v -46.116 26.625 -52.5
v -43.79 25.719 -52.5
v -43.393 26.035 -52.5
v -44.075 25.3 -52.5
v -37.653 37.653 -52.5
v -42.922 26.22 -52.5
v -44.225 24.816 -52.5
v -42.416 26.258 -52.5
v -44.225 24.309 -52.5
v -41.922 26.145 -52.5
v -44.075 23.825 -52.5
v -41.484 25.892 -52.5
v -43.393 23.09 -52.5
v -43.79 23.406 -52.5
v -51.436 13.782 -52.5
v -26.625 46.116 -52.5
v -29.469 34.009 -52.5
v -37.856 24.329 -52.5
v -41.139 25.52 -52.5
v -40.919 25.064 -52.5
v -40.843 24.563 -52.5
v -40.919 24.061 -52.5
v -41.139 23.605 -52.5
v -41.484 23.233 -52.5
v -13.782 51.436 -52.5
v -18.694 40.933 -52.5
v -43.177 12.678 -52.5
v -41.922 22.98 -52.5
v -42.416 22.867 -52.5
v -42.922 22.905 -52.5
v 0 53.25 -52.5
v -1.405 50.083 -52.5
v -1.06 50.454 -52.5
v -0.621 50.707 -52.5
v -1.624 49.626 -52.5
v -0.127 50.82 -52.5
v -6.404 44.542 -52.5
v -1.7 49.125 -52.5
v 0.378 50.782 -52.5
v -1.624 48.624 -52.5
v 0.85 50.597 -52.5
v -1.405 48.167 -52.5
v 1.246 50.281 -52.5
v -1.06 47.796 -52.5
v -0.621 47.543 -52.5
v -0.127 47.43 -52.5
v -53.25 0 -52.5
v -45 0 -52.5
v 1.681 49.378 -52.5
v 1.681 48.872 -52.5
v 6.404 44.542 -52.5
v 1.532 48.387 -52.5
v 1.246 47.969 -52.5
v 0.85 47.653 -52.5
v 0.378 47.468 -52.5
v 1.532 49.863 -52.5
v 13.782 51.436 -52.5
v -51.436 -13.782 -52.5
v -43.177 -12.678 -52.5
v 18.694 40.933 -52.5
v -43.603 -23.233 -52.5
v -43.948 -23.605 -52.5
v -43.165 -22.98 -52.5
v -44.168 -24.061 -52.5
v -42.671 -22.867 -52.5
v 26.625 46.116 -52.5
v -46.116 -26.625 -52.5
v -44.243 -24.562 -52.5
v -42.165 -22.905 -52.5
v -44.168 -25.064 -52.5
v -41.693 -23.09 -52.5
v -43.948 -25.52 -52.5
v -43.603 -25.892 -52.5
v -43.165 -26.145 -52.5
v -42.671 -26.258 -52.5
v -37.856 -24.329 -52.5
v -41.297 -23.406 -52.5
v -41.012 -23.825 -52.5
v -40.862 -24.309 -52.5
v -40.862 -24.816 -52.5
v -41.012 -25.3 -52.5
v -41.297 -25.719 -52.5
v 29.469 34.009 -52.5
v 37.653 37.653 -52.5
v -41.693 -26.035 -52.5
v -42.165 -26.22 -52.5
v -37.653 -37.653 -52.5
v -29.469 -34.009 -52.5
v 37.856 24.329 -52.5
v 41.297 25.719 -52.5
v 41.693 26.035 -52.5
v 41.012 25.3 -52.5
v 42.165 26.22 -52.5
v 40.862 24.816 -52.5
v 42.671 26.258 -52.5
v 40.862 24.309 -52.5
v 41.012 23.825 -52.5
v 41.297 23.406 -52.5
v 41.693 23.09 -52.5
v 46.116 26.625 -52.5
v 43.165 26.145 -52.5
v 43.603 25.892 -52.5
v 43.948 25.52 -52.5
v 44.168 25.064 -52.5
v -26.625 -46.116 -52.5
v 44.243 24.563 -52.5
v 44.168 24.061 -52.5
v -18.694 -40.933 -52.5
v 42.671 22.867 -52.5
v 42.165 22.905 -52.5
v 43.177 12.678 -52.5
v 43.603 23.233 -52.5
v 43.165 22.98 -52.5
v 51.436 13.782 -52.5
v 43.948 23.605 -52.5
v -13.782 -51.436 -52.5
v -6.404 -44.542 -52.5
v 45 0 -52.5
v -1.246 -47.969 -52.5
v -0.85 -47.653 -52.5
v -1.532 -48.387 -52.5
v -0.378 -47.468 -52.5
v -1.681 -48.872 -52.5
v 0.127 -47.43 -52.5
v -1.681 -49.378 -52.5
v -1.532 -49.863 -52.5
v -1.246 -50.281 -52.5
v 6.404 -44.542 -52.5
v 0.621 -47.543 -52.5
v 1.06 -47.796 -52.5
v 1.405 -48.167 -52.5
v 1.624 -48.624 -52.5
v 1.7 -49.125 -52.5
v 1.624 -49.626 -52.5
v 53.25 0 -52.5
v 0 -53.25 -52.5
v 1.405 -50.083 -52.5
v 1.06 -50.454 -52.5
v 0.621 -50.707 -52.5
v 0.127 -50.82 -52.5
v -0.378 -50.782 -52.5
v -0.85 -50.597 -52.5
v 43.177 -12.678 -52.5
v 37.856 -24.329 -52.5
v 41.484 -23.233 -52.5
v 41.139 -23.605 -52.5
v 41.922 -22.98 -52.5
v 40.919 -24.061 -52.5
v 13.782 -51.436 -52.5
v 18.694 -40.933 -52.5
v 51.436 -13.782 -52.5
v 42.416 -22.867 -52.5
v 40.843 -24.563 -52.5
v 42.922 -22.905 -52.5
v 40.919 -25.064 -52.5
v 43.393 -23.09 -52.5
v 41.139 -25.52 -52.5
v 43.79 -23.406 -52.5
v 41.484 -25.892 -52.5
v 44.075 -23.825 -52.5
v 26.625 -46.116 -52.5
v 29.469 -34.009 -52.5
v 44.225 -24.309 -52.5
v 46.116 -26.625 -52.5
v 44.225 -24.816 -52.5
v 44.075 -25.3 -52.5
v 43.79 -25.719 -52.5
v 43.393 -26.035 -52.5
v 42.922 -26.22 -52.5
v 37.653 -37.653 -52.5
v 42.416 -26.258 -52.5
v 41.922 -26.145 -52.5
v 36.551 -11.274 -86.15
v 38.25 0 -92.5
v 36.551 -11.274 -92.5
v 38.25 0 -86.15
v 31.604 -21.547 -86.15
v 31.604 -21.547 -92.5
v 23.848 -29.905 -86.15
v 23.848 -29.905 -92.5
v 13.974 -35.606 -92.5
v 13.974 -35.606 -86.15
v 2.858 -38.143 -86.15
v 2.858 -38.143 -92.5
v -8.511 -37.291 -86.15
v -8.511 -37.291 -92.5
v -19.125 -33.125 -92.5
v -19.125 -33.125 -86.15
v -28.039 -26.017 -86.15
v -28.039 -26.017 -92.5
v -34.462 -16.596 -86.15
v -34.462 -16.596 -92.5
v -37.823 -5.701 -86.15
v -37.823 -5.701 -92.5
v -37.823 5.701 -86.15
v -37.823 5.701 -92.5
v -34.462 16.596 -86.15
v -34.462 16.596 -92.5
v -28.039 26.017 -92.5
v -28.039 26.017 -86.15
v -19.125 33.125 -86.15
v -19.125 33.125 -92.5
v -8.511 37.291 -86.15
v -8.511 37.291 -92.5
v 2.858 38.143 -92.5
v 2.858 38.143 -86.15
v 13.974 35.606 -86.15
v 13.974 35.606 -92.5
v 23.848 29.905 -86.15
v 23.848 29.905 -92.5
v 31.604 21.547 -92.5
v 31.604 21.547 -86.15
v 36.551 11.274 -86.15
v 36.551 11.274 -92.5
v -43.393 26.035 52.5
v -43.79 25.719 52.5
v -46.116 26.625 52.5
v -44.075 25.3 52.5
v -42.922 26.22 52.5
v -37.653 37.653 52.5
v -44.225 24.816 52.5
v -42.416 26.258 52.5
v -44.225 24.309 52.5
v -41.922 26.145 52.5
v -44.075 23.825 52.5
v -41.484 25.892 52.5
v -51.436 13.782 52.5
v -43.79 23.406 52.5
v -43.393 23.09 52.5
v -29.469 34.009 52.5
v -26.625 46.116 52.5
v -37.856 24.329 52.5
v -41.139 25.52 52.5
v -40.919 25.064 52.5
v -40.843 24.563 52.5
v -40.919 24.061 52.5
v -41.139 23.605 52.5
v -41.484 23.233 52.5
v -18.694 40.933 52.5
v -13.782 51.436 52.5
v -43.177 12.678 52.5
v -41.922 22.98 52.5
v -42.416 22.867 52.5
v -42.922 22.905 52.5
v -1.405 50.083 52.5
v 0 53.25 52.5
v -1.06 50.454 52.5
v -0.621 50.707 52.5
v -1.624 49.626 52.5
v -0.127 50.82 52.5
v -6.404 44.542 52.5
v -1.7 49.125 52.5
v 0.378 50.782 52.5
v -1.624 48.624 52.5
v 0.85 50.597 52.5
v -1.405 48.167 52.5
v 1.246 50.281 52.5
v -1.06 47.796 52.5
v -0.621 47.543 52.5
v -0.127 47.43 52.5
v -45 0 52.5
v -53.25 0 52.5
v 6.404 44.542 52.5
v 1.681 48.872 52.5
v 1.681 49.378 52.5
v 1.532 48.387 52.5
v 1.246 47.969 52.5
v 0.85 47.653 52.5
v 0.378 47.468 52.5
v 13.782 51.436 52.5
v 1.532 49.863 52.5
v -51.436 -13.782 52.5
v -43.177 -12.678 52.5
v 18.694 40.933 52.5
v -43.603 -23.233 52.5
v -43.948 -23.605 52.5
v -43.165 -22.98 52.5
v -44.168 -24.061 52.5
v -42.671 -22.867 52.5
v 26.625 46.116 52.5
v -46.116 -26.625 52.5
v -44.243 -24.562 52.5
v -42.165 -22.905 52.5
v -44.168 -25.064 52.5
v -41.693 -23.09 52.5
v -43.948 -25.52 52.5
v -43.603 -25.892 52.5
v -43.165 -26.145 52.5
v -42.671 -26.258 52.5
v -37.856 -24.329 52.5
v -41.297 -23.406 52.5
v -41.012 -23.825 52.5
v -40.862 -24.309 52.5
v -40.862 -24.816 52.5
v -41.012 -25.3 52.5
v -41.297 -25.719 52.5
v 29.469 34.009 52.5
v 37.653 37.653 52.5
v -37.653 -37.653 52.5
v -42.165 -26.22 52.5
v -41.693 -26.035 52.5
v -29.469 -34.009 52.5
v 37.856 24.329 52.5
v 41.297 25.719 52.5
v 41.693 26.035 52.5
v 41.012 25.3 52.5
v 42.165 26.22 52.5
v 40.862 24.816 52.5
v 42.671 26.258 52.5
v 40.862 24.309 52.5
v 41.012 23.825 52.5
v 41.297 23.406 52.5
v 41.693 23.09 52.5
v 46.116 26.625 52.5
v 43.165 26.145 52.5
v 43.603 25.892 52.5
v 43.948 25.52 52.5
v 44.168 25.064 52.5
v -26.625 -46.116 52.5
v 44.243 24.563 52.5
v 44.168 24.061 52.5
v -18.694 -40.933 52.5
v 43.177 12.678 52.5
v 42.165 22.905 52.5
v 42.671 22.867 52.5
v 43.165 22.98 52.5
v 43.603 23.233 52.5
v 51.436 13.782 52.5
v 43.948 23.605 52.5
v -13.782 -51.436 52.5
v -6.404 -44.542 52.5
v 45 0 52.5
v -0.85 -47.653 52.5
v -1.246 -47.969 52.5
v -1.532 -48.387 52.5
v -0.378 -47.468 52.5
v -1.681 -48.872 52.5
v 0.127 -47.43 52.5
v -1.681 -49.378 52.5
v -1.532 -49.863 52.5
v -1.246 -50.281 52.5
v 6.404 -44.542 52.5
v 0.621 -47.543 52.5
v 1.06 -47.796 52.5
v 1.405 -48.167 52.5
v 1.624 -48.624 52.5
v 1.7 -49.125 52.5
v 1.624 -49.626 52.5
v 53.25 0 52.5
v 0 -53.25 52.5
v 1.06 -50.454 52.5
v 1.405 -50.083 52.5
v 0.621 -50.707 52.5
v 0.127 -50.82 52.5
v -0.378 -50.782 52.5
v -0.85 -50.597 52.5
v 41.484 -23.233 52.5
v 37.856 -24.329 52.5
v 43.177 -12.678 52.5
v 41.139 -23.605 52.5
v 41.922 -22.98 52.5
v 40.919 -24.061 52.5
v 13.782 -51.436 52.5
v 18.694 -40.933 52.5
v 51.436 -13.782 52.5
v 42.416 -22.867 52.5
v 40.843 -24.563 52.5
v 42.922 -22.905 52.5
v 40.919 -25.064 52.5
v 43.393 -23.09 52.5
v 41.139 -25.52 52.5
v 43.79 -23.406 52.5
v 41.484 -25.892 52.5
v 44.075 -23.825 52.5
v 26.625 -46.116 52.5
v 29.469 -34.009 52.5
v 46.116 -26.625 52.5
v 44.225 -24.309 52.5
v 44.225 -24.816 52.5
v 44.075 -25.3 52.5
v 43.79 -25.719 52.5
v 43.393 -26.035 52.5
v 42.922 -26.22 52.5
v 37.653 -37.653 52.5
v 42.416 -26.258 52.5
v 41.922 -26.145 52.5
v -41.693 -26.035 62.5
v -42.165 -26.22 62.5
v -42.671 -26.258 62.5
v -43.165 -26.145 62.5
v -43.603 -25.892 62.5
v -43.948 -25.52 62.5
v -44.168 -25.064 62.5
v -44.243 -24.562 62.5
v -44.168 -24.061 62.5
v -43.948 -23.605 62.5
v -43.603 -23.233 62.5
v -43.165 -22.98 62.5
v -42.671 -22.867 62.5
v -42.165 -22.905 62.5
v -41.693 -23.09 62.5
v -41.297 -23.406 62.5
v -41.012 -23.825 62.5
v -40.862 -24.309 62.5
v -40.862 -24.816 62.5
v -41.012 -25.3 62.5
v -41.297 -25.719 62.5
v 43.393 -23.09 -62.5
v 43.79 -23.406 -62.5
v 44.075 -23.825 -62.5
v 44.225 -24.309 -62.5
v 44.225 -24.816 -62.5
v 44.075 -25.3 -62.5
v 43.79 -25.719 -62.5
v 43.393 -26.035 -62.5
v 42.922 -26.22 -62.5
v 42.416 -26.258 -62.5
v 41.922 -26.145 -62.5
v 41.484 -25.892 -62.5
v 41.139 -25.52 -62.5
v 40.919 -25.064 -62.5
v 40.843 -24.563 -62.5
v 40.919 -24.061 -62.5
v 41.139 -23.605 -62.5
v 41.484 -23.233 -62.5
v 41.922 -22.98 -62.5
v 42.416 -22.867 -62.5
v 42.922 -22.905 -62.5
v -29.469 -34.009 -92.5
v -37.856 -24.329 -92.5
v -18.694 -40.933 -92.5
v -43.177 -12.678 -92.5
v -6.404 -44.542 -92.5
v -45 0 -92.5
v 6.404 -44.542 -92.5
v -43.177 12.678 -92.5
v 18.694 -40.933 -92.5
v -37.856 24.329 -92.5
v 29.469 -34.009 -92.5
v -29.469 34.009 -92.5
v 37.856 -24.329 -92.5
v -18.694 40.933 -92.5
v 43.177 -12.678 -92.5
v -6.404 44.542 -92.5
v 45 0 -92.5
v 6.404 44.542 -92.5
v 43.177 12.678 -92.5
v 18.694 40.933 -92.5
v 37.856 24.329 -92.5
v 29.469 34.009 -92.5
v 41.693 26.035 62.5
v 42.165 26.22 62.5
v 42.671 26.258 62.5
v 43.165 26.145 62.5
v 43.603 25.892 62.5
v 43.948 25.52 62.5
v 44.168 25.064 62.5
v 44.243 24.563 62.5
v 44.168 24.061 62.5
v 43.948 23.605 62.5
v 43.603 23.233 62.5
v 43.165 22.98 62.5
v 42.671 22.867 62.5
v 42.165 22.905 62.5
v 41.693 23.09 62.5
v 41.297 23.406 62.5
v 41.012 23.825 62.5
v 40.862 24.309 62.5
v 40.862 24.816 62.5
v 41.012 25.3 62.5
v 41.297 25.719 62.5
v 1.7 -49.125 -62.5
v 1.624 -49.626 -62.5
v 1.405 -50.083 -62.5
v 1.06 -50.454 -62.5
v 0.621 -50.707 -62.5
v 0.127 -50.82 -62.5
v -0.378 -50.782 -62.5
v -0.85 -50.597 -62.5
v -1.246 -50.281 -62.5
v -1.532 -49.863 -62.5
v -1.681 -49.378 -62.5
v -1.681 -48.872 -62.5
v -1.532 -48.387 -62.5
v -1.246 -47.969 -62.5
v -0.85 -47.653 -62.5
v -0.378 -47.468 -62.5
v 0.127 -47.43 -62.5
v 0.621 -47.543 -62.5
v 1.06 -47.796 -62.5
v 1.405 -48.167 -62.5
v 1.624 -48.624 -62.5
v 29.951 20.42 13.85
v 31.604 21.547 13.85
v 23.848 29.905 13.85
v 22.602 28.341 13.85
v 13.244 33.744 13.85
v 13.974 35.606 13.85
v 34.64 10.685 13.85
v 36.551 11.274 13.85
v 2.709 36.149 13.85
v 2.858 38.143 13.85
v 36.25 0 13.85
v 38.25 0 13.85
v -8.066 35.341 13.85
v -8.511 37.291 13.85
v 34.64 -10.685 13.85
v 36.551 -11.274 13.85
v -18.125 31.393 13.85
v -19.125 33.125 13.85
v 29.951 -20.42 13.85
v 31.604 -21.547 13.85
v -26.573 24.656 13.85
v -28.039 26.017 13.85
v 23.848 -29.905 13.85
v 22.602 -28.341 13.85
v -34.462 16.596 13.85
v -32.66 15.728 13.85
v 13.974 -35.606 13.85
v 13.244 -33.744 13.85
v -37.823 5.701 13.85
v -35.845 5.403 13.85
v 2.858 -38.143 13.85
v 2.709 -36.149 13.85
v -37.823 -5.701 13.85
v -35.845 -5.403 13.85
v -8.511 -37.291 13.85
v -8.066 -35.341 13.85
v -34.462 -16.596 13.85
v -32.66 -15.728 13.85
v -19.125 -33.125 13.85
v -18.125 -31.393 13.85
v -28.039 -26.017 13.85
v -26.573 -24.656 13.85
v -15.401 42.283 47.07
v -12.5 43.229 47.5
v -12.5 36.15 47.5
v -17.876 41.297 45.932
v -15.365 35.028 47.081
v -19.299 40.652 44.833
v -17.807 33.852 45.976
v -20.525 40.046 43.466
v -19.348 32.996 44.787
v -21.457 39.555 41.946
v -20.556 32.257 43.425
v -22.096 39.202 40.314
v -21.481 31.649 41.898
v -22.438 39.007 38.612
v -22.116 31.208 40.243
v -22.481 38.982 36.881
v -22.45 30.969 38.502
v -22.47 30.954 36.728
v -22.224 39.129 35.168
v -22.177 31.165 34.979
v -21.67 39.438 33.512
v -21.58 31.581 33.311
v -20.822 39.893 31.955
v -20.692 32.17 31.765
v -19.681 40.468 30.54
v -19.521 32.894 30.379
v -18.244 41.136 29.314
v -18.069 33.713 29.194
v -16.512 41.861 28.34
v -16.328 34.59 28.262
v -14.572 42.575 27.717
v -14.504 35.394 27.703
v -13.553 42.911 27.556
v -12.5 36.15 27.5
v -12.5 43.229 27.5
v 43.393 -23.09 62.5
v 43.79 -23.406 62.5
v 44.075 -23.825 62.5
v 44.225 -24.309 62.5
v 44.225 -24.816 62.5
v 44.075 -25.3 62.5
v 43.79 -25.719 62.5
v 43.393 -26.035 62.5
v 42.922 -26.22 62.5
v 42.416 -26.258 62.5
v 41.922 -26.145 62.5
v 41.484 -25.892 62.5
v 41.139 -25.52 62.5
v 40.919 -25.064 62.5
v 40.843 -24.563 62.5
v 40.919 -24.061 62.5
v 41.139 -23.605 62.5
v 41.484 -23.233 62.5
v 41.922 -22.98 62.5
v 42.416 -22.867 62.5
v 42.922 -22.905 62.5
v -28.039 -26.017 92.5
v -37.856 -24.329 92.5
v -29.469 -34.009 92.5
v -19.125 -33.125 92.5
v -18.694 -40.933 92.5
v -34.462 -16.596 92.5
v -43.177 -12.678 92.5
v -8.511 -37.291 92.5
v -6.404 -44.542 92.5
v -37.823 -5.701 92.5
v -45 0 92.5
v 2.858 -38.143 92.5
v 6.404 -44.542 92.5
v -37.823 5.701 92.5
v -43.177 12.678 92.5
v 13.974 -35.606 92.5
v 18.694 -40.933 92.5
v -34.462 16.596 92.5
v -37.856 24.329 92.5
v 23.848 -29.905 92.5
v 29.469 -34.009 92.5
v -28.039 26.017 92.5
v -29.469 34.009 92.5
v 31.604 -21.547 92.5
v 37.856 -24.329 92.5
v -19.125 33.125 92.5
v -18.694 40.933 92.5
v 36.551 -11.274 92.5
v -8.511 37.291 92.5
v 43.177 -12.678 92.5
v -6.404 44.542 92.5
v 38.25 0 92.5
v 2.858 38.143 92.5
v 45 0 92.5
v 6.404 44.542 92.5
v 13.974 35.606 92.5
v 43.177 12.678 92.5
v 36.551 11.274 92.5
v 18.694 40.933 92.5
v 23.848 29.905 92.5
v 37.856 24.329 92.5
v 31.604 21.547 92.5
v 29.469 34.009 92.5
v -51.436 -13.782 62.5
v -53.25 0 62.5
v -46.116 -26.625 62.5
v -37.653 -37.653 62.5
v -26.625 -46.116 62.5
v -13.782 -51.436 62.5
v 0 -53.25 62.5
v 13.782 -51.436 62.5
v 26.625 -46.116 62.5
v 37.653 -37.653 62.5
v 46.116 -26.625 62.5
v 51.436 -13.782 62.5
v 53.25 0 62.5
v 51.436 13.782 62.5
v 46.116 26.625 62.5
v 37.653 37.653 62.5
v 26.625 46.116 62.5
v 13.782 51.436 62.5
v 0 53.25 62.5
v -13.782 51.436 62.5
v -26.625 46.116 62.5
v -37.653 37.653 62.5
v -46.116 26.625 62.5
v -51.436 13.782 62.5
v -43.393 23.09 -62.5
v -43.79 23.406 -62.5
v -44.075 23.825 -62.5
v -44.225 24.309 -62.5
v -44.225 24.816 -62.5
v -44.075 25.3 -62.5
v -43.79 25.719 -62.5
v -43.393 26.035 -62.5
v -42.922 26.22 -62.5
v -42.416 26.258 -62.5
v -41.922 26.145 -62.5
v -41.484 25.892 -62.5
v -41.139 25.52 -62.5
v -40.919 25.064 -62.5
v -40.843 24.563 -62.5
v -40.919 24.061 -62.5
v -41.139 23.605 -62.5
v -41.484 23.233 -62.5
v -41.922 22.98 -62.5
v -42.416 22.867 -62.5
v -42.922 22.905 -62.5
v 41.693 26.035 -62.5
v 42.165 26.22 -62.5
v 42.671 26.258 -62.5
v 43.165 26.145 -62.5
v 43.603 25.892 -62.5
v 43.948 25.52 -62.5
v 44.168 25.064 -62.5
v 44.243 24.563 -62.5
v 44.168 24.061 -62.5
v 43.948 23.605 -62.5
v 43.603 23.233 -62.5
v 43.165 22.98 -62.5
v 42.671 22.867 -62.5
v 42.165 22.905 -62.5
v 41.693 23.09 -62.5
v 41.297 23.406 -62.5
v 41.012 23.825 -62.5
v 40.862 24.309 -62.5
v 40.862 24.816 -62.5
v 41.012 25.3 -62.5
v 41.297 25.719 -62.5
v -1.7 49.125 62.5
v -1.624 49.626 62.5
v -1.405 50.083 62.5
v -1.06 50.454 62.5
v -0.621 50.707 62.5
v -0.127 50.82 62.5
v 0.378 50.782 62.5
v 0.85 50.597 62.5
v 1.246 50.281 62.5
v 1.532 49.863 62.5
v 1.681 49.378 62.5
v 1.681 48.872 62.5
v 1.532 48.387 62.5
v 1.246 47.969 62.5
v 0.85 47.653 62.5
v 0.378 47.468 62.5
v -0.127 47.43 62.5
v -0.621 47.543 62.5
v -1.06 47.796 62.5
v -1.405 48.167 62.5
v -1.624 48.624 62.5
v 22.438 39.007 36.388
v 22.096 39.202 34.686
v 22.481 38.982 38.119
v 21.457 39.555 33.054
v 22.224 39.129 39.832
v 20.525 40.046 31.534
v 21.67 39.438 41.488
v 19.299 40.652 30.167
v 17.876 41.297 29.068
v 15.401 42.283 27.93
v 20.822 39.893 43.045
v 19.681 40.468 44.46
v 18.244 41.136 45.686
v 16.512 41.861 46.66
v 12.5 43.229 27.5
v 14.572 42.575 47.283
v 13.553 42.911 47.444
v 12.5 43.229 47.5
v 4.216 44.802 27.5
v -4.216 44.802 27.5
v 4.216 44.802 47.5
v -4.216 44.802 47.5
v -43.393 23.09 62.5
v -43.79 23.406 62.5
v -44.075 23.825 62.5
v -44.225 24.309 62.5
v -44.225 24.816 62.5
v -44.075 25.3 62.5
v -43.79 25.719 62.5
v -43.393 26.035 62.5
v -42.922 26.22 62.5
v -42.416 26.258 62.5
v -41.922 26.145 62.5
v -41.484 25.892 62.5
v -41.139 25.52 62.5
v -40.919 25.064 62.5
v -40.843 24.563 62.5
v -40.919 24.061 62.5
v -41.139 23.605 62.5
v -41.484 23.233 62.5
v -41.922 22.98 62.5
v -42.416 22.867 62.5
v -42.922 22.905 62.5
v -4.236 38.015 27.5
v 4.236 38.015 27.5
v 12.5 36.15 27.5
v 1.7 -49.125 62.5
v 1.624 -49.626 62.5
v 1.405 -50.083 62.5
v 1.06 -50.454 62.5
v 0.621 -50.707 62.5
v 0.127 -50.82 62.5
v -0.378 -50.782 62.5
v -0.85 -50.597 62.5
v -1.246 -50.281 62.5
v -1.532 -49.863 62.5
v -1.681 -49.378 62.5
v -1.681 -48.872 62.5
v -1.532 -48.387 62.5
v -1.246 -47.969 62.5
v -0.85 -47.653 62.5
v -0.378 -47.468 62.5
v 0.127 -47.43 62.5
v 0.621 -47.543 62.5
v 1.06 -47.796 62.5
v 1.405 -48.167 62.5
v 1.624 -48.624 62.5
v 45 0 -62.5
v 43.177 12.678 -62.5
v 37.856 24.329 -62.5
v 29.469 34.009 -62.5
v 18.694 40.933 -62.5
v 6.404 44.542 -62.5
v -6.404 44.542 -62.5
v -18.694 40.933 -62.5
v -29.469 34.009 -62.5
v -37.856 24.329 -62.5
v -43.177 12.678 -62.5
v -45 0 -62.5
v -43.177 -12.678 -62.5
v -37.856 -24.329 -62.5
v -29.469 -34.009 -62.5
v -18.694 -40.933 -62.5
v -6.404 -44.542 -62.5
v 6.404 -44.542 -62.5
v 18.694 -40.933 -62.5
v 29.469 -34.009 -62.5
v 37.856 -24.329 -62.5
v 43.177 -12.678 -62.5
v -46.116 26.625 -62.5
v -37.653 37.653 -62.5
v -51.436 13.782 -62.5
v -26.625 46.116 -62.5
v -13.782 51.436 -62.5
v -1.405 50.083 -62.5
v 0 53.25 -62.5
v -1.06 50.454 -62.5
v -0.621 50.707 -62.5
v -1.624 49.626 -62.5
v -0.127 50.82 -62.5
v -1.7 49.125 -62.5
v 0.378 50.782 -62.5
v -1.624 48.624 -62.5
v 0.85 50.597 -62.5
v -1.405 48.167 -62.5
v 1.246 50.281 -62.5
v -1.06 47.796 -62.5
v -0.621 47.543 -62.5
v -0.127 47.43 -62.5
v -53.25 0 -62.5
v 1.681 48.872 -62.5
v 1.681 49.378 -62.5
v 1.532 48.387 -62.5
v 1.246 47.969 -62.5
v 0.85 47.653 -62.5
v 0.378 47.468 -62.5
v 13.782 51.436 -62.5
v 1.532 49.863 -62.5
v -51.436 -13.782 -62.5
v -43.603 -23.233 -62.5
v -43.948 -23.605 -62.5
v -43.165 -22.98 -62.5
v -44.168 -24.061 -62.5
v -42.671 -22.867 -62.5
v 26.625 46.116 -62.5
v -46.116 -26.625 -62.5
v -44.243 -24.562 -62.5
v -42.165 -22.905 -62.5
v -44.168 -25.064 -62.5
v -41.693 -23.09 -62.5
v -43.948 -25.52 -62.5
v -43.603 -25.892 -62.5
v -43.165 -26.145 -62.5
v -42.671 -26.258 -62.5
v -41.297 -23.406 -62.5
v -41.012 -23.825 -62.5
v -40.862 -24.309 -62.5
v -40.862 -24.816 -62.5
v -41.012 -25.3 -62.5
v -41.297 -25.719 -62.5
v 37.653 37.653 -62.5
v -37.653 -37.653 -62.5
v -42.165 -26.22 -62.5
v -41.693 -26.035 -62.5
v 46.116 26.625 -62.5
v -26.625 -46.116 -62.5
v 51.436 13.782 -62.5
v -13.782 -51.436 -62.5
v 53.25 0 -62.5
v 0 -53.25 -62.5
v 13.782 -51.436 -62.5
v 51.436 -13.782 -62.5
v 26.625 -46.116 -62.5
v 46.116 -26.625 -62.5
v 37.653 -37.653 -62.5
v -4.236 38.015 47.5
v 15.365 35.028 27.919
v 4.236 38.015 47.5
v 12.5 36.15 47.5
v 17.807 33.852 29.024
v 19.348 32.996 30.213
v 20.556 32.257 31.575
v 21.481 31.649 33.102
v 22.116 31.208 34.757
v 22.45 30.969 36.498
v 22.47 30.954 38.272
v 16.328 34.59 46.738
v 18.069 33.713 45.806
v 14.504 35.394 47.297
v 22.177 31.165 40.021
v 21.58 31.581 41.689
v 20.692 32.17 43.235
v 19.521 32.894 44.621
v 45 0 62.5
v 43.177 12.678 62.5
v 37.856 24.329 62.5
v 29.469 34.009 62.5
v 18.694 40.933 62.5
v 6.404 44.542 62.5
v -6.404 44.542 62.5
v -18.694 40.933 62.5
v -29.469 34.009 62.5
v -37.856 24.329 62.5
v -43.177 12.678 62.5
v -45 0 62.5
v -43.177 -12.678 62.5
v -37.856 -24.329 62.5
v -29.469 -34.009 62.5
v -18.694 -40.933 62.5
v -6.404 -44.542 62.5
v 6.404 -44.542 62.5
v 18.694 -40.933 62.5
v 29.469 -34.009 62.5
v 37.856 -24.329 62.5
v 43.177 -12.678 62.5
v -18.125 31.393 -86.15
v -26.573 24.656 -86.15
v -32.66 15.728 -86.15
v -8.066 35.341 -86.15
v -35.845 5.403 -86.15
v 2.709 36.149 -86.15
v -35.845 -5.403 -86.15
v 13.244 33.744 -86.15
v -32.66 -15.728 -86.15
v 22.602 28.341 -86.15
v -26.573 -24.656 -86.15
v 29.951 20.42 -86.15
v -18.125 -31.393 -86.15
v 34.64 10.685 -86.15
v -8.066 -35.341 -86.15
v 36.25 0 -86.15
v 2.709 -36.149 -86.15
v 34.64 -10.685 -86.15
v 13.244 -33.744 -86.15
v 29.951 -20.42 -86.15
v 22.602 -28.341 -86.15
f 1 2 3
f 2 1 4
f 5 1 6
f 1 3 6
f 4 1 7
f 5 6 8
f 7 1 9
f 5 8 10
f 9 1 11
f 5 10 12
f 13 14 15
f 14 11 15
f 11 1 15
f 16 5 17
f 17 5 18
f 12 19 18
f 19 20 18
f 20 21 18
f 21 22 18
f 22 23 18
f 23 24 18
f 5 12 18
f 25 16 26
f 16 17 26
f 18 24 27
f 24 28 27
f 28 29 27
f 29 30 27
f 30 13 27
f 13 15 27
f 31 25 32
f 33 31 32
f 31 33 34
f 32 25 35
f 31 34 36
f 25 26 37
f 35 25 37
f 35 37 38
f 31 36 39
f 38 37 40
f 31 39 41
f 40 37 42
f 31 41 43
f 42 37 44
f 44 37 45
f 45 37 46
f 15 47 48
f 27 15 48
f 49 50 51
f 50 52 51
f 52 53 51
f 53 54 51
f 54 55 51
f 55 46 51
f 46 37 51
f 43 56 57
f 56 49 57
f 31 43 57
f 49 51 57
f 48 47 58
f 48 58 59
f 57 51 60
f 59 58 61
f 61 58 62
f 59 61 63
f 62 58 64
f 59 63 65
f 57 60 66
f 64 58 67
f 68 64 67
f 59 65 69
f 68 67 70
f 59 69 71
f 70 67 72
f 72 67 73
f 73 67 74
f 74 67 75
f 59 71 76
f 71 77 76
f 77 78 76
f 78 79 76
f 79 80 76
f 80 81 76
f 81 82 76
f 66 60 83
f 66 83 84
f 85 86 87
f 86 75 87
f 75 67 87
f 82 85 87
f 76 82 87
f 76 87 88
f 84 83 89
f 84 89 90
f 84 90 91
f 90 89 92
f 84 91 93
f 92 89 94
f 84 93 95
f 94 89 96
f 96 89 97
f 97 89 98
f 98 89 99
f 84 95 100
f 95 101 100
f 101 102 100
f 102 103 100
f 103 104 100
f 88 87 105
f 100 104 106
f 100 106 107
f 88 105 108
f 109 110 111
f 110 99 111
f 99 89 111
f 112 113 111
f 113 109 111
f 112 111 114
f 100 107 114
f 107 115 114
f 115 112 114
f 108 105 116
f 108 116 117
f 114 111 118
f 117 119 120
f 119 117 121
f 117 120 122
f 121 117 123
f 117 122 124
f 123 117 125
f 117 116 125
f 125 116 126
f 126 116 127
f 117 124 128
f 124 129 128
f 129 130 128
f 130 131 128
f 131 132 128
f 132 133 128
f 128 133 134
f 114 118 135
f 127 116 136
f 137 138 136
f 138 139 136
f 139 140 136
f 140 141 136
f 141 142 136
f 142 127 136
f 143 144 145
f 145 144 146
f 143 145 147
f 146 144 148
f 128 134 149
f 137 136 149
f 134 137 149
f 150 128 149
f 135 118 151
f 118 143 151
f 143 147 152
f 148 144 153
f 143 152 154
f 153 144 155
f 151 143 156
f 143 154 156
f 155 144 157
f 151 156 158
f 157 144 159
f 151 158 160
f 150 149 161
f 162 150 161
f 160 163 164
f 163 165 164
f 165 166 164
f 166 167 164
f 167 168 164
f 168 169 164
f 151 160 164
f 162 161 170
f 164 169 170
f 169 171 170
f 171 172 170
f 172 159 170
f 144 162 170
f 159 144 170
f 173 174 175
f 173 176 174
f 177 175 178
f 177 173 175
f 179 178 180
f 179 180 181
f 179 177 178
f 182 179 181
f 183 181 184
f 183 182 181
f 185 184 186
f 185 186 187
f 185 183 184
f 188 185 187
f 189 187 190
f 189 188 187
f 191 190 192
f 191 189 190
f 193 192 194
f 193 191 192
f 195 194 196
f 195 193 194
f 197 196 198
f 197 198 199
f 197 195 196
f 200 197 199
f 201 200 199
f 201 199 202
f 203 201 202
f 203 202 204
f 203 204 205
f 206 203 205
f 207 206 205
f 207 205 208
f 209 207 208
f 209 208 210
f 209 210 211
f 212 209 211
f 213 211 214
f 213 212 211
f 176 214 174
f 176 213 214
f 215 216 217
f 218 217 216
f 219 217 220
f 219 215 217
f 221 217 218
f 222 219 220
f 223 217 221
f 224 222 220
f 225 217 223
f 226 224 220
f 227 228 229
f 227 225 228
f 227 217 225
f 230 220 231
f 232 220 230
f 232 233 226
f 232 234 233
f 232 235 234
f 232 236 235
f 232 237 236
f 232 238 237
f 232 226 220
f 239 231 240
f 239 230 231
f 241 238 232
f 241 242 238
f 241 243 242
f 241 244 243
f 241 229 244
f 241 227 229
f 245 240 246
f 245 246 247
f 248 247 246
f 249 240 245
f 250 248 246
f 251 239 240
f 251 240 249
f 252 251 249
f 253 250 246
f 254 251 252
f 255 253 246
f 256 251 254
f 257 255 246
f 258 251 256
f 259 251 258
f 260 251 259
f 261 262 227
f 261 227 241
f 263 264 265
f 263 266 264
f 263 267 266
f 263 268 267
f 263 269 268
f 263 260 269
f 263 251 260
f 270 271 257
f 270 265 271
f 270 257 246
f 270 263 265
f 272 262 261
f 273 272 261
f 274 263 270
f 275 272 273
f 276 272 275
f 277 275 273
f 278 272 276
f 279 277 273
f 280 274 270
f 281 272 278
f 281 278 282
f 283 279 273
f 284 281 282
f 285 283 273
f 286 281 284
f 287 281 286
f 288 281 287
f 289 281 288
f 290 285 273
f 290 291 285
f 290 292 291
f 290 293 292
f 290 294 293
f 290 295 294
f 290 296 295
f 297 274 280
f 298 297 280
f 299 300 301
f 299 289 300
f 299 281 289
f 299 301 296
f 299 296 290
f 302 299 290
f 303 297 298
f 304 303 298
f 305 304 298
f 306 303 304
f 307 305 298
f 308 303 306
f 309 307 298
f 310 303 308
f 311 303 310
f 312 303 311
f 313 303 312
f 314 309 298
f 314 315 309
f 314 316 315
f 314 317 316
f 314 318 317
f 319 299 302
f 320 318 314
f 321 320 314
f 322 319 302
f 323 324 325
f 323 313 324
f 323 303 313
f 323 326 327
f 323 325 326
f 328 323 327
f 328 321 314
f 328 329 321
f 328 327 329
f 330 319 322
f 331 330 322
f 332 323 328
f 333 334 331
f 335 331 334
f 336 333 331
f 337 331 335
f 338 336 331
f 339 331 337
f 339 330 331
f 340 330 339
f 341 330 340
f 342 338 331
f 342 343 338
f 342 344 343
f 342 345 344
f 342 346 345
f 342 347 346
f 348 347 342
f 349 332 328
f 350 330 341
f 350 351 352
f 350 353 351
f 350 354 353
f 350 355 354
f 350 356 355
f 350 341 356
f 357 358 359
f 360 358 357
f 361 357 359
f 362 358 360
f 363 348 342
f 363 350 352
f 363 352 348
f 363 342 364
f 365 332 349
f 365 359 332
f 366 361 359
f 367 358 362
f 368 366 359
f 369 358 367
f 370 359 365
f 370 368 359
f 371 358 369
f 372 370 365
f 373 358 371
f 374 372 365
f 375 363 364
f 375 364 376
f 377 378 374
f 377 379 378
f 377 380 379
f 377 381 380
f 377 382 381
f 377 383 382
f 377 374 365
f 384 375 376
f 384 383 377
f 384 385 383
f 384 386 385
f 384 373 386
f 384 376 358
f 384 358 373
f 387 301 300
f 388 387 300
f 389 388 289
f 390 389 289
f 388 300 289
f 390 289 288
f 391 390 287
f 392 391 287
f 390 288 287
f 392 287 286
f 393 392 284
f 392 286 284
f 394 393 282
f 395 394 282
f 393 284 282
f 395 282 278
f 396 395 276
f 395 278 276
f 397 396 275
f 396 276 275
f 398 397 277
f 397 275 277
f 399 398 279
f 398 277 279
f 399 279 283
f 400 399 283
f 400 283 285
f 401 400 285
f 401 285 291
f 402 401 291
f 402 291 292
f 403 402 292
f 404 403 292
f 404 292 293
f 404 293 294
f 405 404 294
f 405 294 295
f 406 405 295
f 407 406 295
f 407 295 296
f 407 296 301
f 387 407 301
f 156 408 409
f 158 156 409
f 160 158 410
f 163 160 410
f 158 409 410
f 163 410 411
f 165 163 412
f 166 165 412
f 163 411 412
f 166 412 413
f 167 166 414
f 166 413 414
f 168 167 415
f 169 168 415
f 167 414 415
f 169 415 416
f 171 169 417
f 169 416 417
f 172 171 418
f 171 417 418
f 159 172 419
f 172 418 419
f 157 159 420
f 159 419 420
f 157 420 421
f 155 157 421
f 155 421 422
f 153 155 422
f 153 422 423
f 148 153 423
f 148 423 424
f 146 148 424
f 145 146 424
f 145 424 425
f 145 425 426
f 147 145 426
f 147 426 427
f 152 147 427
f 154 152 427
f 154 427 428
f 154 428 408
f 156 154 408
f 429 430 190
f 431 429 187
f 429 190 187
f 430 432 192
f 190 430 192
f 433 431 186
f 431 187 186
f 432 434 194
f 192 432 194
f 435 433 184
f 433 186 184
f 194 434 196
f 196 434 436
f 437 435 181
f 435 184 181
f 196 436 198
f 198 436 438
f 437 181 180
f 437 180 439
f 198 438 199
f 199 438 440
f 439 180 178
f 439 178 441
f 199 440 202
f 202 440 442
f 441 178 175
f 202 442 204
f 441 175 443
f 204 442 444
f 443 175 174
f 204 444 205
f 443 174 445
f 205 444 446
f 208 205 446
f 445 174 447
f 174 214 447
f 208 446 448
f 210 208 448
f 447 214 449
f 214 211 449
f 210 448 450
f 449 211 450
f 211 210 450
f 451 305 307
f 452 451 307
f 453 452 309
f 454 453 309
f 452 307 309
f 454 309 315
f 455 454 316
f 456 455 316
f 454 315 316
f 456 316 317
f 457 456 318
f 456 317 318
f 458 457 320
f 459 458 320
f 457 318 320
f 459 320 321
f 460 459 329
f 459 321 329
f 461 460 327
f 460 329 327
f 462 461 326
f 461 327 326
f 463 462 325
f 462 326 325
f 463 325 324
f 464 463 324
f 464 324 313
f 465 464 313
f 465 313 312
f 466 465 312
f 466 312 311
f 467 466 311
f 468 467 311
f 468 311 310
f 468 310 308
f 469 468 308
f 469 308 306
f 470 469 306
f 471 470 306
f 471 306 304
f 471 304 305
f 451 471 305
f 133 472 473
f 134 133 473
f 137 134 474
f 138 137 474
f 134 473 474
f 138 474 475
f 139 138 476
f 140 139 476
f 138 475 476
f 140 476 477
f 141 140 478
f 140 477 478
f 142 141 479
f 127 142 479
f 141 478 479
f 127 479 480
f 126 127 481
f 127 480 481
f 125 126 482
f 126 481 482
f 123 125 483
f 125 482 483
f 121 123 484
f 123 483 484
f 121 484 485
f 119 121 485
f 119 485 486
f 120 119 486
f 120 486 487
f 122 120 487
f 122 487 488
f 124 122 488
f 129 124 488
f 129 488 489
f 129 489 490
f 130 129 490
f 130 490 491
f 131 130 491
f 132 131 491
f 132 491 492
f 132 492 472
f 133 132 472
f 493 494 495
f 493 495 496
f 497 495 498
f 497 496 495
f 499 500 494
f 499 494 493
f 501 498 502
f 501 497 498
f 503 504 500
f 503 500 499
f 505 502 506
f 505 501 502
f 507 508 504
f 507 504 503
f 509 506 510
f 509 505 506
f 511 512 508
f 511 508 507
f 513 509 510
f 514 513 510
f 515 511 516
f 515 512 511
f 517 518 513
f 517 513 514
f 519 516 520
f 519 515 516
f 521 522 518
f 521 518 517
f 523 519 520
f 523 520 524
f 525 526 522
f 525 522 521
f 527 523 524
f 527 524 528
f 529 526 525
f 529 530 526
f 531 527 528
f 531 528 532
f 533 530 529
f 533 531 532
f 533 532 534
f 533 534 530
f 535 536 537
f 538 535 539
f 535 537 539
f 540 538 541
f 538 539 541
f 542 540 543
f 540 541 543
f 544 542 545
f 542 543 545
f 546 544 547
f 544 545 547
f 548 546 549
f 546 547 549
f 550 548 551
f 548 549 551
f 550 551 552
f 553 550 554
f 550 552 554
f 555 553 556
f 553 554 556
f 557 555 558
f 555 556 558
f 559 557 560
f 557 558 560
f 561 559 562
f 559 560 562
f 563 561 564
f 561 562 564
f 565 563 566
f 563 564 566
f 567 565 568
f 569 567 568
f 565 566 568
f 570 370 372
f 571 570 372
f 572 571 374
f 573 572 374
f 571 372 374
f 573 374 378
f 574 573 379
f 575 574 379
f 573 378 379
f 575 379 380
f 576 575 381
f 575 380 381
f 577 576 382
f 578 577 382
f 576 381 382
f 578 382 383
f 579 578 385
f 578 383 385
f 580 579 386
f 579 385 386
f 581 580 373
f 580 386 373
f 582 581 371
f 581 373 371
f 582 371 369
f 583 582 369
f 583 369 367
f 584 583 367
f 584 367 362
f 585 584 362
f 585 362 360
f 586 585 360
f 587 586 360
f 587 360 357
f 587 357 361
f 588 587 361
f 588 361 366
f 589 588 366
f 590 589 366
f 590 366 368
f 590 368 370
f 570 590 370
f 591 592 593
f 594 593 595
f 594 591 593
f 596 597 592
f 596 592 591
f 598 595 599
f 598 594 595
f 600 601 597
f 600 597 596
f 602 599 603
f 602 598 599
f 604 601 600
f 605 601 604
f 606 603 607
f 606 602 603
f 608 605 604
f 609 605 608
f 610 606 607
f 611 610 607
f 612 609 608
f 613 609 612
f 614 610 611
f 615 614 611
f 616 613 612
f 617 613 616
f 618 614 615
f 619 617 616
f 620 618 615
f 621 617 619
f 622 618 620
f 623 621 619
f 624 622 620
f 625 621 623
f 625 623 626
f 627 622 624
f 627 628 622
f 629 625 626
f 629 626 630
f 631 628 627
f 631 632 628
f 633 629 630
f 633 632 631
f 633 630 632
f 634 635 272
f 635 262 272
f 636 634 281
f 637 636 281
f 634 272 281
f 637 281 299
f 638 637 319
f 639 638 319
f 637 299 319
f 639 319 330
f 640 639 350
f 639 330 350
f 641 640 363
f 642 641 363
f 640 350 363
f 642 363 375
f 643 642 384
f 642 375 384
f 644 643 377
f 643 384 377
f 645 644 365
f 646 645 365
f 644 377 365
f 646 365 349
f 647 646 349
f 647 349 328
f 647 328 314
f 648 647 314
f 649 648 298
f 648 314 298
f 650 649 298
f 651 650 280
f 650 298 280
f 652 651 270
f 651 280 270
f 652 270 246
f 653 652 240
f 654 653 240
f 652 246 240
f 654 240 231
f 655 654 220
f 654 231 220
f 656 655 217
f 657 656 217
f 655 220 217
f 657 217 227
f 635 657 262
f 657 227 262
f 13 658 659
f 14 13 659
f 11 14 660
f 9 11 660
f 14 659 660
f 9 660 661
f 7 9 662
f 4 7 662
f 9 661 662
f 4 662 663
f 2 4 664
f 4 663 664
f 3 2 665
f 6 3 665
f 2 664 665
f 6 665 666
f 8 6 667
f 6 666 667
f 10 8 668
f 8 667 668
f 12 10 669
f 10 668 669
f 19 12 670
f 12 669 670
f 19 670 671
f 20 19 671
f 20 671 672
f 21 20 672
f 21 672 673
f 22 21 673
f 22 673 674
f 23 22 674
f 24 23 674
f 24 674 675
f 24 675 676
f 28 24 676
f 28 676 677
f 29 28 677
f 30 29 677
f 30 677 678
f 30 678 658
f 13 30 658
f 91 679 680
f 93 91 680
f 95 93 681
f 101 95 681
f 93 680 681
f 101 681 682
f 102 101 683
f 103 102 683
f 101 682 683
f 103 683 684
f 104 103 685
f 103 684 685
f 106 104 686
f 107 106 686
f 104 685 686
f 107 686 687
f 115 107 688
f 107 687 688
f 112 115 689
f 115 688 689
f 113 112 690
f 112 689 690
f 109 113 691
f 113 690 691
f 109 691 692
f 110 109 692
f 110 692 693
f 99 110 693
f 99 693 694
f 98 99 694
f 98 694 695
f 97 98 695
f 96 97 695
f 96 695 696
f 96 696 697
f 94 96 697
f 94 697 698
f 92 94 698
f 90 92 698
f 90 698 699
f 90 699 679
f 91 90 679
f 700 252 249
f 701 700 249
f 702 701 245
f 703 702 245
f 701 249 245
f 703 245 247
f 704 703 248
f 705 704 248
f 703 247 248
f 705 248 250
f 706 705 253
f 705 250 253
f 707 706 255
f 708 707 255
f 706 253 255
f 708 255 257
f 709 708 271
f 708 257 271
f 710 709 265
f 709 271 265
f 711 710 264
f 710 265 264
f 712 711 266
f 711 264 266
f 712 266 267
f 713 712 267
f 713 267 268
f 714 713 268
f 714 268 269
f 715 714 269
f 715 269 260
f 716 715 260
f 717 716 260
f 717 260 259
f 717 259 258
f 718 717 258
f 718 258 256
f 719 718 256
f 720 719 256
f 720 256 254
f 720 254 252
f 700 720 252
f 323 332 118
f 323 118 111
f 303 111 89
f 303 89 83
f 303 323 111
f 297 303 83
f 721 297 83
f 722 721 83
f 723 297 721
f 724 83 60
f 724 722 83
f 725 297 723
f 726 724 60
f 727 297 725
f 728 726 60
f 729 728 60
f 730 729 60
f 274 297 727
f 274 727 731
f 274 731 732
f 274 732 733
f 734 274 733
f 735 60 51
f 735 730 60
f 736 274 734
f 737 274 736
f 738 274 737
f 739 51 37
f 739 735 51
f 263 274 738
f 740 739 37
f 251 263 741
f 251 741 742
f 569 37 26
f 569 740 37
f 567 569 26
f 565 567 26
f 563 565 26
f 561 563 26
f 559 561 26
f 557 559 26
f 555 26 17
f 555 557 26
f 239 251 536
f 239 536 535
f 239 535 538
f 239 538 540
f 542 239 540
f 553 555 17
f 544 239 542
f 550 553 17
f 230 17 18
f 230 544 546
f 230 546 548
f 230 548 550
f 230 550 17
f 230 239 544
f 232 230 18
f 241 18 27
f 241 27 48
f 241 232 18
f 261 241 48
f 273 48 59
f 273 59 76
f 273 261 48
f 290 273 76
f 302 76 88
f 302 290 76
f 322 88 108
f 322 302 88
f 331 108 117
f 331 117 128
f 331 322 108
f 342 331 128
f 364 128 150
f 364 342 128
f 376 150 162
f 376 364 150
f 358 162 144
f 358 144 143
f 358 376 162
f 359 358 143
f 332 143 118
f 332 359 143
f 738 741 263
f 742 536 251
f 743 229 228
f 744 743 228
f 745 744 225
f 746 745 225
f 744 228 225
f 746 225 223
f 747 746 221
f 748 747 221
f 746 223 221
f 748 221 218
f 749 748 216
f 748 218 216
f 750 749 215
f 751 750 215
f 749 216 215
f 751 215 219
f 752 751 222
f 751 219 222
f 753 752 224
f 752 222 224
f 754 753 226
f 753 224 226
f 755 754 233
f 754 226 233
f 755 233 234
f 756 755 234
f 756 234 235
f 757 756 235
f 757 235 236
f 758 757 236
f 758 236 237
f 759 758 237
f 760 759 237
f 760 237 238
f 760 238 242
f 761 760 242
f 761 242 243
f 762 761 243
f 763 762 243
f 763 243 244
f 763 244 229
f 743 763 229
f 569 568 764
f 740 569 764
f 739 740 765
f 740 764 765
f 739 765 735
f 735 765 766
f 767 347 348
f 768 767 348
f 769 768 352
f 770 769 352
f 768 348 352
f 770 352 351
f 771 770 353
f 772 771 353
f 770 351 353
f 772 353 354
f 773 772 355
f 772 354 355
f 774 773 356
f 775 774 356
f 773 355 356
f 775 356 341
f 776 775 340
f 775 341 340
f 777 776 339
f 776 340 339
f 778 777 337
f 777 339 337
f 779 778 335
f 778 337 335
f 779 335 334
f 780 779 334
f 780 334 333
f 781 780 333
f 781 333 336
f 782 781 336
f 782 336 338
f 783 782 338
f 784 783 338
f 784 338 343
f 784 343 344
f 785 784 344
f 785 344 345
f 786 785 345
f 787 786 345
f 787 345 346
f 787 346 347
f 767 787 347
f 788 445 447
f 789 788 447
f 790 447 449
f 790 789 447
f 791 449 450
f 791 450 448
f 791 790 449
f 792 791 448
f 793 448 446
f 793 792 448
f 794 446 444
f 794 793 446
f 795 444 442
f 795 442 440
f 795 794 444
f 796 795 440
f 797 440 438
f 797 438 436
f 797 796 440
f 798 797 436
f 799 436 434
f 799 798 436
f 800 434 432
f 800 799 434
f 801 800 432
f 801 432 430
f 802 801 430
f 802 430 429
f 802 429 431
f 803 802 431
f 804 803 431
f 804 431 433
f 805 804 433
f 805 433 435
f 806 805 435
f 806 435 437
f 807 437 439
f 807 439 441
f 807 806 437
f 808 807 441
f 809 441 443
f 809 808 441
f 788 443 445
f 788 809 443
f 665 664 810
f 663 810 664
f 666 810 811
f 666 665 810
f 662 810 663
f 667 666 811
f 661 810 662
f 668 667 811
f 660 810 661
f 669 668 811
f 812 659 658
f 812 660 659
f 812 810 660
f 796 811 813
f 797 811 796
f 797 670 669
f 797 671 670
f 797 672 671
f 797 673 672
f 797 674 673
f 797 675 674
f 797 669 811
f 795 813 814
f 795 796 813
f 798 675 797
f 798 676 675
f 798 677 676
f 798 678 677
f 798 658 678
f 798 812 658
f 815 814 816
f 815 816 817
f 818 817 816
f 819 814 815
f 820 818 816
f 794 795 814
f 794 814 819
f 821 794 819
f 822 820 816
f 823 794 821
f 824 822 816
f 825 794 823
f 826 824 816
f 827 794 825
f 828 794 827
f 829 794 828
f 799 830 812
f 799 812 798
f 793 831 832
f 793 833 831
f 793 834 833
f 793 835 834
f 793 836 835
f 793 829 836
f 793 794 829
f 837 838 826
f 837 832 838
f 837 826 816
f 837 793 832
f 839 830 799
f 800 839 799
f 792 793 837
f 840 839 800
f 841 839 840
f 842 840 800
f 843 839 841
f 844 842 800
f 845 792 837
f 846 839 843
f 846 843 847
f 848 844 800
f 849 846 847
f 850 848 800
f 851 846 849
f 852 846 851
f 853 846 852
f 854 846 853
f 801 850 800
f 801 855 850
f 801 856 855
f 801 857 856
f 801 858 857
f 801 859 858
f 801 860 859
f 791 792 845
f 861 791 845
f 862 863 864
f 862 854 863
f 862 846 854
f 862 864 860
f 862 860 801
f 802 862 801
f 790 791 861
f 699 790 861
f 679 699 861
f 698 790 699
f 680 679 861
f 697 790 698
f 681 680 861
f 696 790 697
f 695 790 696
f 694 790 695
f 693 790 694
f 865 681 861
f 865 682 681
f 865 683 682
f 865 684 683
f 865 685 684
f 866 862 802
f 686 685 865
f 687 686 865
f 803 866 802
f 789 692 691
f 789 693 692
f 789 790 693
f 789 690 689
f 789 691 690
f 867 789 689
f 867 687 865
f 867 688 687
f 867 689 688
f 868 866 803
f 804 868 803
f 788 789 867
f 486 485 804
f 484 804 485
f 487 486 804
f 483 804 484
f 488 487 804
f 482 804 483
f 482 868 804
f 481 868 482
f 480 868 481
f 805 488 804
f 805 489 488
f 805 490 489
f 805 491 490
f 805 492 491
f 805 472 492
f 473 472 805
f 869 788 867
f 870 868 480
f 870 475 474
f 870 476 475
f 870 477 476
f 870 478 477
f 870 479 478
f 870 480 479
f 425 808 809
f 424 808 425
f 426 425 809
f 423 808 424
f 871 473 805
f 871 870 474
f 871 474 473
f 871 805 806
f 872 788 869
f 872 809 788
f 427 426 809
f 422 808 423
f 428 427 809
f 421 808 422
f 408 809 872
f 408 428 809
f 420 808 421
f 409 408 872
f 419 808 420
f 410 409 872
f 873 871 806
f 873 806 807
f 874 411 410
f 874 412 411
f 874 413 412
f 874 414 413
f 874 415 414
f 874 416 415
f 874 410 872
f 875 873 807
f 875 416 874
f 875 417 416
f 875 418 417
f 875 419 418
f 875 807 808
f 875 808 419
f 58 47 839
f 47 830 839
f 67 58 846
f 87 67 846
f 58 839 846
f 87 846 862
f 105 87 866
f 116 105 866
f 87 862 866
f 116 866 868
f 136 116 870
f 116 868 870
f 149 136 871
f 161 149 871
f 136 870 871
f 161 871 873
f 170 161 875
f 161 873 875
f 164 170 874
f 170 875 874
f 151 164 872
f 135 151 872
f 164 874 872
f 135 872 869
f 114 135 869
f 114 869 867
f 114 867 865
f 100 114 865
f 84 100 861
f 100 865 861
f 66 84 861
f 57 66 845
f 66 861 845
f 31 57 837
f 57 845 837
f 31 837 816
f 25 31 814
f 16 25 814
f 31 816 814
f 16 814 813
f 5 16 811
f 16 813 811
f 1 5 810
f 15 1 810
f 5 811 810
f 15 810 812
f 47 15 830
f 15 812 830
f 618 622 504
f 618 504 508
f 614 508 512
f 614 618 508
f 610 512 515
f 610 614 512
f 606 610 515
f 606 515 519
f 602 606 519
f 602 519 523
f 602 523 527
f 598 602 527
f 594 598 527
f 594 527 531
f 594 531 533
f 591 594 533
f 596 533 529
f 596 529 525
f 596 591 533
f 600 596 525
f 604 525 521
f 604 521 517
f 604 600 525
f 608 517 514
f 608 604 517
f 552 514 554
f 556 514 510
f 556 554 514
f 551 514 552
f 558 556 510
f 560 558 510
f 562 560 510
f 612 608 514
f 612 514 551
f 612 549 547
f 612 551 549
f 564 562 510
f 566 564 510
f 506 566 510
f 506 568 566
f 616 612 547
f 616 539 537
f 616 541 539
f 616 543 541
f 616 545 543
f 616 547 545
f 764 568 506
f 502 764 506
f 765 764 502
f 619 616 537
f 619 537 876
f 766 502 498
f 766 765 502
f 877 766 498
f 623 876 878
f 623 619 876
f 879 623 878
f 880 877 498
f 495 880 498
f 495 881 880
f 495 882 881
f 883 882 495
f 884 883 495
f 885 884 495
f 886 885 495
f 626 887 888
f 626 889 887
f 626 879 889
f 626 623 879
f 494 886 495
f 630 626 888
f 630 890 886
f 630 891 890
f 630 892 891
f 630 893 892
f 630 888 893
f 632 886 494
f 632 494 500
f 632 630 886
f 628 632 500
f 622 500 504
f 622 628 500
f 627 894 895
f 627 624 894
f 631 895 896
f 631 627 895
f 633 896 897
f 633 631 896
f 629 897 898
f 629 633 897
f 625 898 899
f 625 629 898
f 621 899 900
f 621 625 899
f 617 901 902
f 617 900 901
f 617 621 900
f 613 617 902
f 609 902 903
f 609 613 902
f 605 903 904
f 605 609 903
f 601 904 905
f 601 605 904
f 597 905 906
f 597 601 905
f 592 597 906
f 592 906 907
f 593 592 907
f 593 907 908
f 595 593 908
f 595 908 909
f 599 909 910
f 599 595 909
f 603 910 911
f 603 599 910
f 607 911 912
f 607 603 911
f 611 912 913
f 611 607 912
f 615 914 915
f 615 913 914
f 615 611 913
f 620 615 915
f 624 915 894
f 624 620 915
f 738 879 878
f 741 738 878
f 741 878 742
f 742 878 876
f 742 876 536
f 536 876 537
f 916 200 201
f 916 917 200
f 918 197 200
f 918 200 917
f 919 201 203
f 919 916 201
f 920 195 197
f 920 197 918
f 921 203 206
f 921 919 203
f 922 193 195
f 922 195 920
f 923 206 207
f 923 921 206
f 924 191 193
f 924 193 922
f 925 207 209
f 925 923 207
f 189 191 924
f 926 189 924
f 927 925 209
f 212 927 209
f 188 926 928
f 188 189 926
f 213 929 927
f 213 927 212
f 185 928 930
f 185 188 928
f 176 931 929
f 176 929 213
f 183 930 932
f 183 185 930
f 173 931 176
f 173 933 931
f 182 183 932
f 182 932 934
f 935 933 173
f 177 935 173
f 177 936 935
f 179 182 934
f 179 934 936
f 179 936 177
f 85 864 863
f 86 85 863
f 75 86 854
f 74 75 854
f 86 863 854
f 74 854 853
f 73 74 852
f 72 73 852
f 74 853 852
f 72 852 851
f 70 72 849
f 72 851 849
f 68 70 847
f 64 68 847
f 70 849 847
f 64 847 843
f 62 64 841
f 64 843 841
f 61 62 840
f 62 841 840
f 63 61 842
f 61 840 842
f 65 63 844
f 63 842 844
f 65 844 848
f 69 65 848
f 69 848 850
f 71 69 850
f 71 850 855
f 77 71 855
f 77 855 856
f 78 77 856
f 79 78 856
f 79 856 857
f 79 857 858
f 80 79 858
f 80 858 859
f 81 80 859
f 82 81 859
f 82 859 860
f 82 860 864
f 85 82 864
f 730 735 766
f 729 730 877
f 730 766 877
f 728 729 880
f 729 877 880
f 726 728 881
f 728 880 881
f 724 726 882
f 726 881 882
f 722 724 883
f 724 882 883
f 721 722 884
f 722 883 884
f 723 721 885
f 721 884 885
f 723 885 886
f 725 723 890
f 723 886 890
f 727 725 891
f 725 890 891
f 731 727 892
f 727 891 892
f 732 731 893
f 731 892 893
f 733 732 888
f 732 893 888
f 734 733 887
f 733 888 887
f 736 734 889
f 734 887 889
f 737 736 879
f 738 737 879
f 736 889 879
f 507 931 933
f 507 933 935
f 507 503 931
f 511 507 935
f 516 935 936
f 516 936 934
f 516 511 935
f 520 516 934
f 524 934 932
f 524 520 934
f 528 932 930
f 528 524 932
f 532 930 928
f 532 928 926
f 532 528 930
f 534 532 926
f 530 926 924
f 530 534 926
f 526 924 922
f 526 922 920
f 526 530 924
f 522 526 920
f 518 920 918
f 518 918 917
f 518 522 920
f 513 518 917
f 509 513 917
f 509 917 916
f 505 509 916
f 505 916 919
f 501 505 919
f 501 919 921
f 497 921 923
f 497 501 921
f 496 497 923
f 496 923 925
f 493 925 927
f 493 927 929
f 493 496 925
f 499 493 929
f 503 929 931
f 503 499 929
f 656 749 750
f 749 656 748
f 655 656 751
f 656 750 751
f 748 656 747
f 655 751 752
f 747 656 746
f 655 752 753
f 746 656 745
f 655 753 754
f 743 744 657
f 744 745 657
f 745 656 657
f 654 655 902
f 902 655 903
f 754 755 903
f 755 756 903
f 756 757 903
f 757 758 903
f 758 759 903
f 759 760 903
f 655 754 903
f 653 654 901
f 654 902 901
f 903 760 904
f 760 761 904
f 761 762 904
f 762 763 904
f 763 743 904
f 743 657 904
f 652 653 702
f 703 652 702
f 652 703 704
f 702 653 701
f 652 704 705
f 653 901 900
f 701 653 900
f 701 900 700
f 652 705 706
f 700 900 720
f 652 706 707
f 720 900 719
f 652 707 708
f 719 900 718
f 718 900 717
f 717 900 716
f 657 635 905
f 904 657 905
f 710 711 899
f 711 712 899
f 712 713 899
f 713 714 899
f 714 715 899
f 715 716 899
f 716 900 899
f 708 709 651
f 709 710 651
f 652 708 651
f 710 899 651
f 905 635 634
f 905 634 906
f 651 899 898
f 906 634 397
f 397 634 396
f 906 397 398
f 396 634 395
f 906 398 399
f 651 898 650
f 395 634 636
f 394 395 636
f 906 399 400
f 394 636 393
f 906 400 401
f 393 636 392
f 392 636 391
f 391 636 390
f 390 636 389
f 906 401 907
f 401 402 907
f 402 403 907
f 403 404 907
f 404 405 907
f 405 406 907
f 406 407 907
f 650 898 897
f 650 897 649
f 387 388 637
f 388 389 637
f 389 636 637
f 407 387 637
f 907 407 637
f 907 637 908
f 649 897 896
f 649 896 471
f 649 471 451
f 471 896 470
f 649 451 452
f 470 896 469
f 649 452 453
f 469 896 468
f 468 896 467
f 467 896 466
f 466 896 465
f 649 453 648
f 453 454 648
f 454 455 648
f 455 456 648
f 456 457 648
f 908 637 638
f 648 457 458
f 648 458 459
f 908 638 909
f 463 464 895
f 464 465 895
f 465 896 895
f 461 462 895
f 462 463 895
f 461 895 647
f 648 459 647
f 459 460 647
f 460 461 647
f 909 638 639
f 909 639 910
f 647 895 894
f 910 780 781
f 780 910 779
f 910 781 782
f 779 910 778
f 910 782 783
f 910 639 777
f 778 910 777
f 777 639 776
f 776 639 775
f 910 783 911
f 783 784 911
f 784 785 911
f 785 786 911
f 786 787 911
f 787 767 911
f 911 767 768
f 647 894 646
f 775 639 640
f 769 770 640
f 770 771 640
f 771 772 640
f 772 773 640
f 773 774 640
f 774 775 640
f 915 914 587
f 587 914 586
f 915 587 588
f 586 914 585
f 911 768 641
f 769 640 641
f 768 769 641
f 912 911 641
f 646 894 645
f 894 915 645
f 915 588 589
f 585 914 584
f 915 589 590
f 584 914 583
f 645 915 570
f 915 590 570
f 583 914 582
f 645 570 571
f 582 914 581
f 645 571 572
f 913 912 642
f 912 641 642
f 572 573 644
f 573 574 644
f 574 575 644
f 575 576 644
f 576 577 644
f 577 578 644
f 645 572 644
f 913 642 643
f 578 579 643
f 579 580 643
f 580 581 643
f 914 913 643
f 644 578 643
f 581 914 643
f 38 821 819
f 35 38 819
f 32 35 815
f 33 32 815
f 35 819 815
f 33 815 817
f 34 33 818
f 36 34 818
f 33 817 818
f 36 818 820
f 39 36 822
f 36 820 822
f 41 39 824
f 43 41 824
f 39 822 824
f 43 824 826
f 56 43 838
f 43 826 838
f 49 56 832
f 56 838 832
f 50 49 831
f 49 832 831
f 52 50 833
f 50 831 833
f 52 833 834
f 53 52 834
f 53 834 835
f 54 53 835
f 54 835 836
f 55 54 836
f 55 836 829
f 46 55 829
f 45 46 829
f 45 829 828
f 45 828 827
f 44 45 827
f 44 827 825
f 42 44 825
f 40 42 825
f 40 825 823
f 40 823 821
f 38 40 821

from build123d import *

# Parameters (mm, degrees)
SKETCH1_R            = 45
SKETCH1_R_2          = 33.75
BOSS_EXTRUDE1_DEPTH  = 92.5
SKETCH4_W            = 10
SKETCH4_H            = 8.25
CUT_EXTRUDE1_DEPTH   = 120.278560521
M3_CLEARANCE_HOLE1_D = 3.4
CIRPATTERN1_COUNT    = 6


with BuildPart() as part:
    # Sketch1 → Boss-Extrude1 (new, symmetric)
    with BuildSketch(Plane.XY):
        Circle(SKETCH1_R)
        Circle(SKETCH1_R_2, mode=Mode.SUBTRACT)
    extrude(amount=BOSS_EXTRUDE1_DEPTH, both=True)

    # Sketch2 → Cut-Revolve1 (revolve, cut)
    with BuildSketch(Plane(origin=(0, 0, 0), x_dir=(1, 0, 0), z_dir=(0, 1, 0)), mode=Mode.PRIVATE) as cut_revolve1_sk:
        Polygon((0, -92.5), (0, 92.5), (-38.25, 92.5), (-38.25, 86.15), (-36.25, 86.15), (-36.25, -13.85), (-38.25, -13.85), (-38.25, -92.5), align=None)
    revolve(cut_revolve1_sk.sketch.rotate(Axis((0, 0, 92.5), (0, 0, -1)), 180), axis=Axis((0, 0, 92.5), (0, 0, -1)), mode=Mode.SUBTRACT)

    # Sketch4 → Revolve1 (revolve)
    with BuildSketch(Plane(origin=(0, 0, 0), x_dir=(0, 0, -1), z_dir=(1, 0, 0)), mode=Mode.PRIVATE) as revolve1_sk:
        with Locations((-57.5, 49.125)):
            Rectangle(SKETCH4_W, SKETCH4_H)
        with Locations((57.5, 49.125)):
            Rectangle(SKETCH4_W, SKETCH4_H)
    revolve(revolve1_sk.sketch.rotate(Axis((0, 0, -92.5), (0, 0, 1)), 90), axis=Axis((0, 0, -92.5), (0, 0, 1)))

    # Sketch3 → Cut-Extrude1 (cut, through all)
    with BuildSketch(Plane(origin=(0, 0, 0), x_dir=(1, 0, 0), z_dir=(0, 1, 0))):
        with BuildLine():
            Line((-12.5, -27.5), (12.5, -27.5))
            ThreePointArc((12.5, -27.5), (22.5, -37.5), (12.5, -47.5))
            Line((12.5, -47.5), (-12.5, -47.5))
            ThreePointArc((-12.5, -47.5), (-22.5, -37.5), (-12.5, -27.5))
        make_face()
    extrude(amount=CUT_EXTRUDE1_DEPTH, mode=Mode.SUBTRACT)

    # M3 Clearance Hole1 (through all)
    with Locations(Plane.XY.offset(62.5)):
        with Locations((0, 49.125)):
            m3_clearance_hole1 = Hole(M3_CLEARANCE_HOLE1_D / 2)

    # CirPattern1: M3 Clearance Hole1 ×6 about axis
    cirpattern1_axis = Axis((0, 0, 0), (0, 0, 1))
    for i in range(1, CIRPATTERN1_COUNT):
        add(m3_clearance_hole1.rotate(cirpattern1_axis, i * 360 / CIRPATTERN1_COUNT), mode=Mode.SUBTRACT)


solid = part.part
